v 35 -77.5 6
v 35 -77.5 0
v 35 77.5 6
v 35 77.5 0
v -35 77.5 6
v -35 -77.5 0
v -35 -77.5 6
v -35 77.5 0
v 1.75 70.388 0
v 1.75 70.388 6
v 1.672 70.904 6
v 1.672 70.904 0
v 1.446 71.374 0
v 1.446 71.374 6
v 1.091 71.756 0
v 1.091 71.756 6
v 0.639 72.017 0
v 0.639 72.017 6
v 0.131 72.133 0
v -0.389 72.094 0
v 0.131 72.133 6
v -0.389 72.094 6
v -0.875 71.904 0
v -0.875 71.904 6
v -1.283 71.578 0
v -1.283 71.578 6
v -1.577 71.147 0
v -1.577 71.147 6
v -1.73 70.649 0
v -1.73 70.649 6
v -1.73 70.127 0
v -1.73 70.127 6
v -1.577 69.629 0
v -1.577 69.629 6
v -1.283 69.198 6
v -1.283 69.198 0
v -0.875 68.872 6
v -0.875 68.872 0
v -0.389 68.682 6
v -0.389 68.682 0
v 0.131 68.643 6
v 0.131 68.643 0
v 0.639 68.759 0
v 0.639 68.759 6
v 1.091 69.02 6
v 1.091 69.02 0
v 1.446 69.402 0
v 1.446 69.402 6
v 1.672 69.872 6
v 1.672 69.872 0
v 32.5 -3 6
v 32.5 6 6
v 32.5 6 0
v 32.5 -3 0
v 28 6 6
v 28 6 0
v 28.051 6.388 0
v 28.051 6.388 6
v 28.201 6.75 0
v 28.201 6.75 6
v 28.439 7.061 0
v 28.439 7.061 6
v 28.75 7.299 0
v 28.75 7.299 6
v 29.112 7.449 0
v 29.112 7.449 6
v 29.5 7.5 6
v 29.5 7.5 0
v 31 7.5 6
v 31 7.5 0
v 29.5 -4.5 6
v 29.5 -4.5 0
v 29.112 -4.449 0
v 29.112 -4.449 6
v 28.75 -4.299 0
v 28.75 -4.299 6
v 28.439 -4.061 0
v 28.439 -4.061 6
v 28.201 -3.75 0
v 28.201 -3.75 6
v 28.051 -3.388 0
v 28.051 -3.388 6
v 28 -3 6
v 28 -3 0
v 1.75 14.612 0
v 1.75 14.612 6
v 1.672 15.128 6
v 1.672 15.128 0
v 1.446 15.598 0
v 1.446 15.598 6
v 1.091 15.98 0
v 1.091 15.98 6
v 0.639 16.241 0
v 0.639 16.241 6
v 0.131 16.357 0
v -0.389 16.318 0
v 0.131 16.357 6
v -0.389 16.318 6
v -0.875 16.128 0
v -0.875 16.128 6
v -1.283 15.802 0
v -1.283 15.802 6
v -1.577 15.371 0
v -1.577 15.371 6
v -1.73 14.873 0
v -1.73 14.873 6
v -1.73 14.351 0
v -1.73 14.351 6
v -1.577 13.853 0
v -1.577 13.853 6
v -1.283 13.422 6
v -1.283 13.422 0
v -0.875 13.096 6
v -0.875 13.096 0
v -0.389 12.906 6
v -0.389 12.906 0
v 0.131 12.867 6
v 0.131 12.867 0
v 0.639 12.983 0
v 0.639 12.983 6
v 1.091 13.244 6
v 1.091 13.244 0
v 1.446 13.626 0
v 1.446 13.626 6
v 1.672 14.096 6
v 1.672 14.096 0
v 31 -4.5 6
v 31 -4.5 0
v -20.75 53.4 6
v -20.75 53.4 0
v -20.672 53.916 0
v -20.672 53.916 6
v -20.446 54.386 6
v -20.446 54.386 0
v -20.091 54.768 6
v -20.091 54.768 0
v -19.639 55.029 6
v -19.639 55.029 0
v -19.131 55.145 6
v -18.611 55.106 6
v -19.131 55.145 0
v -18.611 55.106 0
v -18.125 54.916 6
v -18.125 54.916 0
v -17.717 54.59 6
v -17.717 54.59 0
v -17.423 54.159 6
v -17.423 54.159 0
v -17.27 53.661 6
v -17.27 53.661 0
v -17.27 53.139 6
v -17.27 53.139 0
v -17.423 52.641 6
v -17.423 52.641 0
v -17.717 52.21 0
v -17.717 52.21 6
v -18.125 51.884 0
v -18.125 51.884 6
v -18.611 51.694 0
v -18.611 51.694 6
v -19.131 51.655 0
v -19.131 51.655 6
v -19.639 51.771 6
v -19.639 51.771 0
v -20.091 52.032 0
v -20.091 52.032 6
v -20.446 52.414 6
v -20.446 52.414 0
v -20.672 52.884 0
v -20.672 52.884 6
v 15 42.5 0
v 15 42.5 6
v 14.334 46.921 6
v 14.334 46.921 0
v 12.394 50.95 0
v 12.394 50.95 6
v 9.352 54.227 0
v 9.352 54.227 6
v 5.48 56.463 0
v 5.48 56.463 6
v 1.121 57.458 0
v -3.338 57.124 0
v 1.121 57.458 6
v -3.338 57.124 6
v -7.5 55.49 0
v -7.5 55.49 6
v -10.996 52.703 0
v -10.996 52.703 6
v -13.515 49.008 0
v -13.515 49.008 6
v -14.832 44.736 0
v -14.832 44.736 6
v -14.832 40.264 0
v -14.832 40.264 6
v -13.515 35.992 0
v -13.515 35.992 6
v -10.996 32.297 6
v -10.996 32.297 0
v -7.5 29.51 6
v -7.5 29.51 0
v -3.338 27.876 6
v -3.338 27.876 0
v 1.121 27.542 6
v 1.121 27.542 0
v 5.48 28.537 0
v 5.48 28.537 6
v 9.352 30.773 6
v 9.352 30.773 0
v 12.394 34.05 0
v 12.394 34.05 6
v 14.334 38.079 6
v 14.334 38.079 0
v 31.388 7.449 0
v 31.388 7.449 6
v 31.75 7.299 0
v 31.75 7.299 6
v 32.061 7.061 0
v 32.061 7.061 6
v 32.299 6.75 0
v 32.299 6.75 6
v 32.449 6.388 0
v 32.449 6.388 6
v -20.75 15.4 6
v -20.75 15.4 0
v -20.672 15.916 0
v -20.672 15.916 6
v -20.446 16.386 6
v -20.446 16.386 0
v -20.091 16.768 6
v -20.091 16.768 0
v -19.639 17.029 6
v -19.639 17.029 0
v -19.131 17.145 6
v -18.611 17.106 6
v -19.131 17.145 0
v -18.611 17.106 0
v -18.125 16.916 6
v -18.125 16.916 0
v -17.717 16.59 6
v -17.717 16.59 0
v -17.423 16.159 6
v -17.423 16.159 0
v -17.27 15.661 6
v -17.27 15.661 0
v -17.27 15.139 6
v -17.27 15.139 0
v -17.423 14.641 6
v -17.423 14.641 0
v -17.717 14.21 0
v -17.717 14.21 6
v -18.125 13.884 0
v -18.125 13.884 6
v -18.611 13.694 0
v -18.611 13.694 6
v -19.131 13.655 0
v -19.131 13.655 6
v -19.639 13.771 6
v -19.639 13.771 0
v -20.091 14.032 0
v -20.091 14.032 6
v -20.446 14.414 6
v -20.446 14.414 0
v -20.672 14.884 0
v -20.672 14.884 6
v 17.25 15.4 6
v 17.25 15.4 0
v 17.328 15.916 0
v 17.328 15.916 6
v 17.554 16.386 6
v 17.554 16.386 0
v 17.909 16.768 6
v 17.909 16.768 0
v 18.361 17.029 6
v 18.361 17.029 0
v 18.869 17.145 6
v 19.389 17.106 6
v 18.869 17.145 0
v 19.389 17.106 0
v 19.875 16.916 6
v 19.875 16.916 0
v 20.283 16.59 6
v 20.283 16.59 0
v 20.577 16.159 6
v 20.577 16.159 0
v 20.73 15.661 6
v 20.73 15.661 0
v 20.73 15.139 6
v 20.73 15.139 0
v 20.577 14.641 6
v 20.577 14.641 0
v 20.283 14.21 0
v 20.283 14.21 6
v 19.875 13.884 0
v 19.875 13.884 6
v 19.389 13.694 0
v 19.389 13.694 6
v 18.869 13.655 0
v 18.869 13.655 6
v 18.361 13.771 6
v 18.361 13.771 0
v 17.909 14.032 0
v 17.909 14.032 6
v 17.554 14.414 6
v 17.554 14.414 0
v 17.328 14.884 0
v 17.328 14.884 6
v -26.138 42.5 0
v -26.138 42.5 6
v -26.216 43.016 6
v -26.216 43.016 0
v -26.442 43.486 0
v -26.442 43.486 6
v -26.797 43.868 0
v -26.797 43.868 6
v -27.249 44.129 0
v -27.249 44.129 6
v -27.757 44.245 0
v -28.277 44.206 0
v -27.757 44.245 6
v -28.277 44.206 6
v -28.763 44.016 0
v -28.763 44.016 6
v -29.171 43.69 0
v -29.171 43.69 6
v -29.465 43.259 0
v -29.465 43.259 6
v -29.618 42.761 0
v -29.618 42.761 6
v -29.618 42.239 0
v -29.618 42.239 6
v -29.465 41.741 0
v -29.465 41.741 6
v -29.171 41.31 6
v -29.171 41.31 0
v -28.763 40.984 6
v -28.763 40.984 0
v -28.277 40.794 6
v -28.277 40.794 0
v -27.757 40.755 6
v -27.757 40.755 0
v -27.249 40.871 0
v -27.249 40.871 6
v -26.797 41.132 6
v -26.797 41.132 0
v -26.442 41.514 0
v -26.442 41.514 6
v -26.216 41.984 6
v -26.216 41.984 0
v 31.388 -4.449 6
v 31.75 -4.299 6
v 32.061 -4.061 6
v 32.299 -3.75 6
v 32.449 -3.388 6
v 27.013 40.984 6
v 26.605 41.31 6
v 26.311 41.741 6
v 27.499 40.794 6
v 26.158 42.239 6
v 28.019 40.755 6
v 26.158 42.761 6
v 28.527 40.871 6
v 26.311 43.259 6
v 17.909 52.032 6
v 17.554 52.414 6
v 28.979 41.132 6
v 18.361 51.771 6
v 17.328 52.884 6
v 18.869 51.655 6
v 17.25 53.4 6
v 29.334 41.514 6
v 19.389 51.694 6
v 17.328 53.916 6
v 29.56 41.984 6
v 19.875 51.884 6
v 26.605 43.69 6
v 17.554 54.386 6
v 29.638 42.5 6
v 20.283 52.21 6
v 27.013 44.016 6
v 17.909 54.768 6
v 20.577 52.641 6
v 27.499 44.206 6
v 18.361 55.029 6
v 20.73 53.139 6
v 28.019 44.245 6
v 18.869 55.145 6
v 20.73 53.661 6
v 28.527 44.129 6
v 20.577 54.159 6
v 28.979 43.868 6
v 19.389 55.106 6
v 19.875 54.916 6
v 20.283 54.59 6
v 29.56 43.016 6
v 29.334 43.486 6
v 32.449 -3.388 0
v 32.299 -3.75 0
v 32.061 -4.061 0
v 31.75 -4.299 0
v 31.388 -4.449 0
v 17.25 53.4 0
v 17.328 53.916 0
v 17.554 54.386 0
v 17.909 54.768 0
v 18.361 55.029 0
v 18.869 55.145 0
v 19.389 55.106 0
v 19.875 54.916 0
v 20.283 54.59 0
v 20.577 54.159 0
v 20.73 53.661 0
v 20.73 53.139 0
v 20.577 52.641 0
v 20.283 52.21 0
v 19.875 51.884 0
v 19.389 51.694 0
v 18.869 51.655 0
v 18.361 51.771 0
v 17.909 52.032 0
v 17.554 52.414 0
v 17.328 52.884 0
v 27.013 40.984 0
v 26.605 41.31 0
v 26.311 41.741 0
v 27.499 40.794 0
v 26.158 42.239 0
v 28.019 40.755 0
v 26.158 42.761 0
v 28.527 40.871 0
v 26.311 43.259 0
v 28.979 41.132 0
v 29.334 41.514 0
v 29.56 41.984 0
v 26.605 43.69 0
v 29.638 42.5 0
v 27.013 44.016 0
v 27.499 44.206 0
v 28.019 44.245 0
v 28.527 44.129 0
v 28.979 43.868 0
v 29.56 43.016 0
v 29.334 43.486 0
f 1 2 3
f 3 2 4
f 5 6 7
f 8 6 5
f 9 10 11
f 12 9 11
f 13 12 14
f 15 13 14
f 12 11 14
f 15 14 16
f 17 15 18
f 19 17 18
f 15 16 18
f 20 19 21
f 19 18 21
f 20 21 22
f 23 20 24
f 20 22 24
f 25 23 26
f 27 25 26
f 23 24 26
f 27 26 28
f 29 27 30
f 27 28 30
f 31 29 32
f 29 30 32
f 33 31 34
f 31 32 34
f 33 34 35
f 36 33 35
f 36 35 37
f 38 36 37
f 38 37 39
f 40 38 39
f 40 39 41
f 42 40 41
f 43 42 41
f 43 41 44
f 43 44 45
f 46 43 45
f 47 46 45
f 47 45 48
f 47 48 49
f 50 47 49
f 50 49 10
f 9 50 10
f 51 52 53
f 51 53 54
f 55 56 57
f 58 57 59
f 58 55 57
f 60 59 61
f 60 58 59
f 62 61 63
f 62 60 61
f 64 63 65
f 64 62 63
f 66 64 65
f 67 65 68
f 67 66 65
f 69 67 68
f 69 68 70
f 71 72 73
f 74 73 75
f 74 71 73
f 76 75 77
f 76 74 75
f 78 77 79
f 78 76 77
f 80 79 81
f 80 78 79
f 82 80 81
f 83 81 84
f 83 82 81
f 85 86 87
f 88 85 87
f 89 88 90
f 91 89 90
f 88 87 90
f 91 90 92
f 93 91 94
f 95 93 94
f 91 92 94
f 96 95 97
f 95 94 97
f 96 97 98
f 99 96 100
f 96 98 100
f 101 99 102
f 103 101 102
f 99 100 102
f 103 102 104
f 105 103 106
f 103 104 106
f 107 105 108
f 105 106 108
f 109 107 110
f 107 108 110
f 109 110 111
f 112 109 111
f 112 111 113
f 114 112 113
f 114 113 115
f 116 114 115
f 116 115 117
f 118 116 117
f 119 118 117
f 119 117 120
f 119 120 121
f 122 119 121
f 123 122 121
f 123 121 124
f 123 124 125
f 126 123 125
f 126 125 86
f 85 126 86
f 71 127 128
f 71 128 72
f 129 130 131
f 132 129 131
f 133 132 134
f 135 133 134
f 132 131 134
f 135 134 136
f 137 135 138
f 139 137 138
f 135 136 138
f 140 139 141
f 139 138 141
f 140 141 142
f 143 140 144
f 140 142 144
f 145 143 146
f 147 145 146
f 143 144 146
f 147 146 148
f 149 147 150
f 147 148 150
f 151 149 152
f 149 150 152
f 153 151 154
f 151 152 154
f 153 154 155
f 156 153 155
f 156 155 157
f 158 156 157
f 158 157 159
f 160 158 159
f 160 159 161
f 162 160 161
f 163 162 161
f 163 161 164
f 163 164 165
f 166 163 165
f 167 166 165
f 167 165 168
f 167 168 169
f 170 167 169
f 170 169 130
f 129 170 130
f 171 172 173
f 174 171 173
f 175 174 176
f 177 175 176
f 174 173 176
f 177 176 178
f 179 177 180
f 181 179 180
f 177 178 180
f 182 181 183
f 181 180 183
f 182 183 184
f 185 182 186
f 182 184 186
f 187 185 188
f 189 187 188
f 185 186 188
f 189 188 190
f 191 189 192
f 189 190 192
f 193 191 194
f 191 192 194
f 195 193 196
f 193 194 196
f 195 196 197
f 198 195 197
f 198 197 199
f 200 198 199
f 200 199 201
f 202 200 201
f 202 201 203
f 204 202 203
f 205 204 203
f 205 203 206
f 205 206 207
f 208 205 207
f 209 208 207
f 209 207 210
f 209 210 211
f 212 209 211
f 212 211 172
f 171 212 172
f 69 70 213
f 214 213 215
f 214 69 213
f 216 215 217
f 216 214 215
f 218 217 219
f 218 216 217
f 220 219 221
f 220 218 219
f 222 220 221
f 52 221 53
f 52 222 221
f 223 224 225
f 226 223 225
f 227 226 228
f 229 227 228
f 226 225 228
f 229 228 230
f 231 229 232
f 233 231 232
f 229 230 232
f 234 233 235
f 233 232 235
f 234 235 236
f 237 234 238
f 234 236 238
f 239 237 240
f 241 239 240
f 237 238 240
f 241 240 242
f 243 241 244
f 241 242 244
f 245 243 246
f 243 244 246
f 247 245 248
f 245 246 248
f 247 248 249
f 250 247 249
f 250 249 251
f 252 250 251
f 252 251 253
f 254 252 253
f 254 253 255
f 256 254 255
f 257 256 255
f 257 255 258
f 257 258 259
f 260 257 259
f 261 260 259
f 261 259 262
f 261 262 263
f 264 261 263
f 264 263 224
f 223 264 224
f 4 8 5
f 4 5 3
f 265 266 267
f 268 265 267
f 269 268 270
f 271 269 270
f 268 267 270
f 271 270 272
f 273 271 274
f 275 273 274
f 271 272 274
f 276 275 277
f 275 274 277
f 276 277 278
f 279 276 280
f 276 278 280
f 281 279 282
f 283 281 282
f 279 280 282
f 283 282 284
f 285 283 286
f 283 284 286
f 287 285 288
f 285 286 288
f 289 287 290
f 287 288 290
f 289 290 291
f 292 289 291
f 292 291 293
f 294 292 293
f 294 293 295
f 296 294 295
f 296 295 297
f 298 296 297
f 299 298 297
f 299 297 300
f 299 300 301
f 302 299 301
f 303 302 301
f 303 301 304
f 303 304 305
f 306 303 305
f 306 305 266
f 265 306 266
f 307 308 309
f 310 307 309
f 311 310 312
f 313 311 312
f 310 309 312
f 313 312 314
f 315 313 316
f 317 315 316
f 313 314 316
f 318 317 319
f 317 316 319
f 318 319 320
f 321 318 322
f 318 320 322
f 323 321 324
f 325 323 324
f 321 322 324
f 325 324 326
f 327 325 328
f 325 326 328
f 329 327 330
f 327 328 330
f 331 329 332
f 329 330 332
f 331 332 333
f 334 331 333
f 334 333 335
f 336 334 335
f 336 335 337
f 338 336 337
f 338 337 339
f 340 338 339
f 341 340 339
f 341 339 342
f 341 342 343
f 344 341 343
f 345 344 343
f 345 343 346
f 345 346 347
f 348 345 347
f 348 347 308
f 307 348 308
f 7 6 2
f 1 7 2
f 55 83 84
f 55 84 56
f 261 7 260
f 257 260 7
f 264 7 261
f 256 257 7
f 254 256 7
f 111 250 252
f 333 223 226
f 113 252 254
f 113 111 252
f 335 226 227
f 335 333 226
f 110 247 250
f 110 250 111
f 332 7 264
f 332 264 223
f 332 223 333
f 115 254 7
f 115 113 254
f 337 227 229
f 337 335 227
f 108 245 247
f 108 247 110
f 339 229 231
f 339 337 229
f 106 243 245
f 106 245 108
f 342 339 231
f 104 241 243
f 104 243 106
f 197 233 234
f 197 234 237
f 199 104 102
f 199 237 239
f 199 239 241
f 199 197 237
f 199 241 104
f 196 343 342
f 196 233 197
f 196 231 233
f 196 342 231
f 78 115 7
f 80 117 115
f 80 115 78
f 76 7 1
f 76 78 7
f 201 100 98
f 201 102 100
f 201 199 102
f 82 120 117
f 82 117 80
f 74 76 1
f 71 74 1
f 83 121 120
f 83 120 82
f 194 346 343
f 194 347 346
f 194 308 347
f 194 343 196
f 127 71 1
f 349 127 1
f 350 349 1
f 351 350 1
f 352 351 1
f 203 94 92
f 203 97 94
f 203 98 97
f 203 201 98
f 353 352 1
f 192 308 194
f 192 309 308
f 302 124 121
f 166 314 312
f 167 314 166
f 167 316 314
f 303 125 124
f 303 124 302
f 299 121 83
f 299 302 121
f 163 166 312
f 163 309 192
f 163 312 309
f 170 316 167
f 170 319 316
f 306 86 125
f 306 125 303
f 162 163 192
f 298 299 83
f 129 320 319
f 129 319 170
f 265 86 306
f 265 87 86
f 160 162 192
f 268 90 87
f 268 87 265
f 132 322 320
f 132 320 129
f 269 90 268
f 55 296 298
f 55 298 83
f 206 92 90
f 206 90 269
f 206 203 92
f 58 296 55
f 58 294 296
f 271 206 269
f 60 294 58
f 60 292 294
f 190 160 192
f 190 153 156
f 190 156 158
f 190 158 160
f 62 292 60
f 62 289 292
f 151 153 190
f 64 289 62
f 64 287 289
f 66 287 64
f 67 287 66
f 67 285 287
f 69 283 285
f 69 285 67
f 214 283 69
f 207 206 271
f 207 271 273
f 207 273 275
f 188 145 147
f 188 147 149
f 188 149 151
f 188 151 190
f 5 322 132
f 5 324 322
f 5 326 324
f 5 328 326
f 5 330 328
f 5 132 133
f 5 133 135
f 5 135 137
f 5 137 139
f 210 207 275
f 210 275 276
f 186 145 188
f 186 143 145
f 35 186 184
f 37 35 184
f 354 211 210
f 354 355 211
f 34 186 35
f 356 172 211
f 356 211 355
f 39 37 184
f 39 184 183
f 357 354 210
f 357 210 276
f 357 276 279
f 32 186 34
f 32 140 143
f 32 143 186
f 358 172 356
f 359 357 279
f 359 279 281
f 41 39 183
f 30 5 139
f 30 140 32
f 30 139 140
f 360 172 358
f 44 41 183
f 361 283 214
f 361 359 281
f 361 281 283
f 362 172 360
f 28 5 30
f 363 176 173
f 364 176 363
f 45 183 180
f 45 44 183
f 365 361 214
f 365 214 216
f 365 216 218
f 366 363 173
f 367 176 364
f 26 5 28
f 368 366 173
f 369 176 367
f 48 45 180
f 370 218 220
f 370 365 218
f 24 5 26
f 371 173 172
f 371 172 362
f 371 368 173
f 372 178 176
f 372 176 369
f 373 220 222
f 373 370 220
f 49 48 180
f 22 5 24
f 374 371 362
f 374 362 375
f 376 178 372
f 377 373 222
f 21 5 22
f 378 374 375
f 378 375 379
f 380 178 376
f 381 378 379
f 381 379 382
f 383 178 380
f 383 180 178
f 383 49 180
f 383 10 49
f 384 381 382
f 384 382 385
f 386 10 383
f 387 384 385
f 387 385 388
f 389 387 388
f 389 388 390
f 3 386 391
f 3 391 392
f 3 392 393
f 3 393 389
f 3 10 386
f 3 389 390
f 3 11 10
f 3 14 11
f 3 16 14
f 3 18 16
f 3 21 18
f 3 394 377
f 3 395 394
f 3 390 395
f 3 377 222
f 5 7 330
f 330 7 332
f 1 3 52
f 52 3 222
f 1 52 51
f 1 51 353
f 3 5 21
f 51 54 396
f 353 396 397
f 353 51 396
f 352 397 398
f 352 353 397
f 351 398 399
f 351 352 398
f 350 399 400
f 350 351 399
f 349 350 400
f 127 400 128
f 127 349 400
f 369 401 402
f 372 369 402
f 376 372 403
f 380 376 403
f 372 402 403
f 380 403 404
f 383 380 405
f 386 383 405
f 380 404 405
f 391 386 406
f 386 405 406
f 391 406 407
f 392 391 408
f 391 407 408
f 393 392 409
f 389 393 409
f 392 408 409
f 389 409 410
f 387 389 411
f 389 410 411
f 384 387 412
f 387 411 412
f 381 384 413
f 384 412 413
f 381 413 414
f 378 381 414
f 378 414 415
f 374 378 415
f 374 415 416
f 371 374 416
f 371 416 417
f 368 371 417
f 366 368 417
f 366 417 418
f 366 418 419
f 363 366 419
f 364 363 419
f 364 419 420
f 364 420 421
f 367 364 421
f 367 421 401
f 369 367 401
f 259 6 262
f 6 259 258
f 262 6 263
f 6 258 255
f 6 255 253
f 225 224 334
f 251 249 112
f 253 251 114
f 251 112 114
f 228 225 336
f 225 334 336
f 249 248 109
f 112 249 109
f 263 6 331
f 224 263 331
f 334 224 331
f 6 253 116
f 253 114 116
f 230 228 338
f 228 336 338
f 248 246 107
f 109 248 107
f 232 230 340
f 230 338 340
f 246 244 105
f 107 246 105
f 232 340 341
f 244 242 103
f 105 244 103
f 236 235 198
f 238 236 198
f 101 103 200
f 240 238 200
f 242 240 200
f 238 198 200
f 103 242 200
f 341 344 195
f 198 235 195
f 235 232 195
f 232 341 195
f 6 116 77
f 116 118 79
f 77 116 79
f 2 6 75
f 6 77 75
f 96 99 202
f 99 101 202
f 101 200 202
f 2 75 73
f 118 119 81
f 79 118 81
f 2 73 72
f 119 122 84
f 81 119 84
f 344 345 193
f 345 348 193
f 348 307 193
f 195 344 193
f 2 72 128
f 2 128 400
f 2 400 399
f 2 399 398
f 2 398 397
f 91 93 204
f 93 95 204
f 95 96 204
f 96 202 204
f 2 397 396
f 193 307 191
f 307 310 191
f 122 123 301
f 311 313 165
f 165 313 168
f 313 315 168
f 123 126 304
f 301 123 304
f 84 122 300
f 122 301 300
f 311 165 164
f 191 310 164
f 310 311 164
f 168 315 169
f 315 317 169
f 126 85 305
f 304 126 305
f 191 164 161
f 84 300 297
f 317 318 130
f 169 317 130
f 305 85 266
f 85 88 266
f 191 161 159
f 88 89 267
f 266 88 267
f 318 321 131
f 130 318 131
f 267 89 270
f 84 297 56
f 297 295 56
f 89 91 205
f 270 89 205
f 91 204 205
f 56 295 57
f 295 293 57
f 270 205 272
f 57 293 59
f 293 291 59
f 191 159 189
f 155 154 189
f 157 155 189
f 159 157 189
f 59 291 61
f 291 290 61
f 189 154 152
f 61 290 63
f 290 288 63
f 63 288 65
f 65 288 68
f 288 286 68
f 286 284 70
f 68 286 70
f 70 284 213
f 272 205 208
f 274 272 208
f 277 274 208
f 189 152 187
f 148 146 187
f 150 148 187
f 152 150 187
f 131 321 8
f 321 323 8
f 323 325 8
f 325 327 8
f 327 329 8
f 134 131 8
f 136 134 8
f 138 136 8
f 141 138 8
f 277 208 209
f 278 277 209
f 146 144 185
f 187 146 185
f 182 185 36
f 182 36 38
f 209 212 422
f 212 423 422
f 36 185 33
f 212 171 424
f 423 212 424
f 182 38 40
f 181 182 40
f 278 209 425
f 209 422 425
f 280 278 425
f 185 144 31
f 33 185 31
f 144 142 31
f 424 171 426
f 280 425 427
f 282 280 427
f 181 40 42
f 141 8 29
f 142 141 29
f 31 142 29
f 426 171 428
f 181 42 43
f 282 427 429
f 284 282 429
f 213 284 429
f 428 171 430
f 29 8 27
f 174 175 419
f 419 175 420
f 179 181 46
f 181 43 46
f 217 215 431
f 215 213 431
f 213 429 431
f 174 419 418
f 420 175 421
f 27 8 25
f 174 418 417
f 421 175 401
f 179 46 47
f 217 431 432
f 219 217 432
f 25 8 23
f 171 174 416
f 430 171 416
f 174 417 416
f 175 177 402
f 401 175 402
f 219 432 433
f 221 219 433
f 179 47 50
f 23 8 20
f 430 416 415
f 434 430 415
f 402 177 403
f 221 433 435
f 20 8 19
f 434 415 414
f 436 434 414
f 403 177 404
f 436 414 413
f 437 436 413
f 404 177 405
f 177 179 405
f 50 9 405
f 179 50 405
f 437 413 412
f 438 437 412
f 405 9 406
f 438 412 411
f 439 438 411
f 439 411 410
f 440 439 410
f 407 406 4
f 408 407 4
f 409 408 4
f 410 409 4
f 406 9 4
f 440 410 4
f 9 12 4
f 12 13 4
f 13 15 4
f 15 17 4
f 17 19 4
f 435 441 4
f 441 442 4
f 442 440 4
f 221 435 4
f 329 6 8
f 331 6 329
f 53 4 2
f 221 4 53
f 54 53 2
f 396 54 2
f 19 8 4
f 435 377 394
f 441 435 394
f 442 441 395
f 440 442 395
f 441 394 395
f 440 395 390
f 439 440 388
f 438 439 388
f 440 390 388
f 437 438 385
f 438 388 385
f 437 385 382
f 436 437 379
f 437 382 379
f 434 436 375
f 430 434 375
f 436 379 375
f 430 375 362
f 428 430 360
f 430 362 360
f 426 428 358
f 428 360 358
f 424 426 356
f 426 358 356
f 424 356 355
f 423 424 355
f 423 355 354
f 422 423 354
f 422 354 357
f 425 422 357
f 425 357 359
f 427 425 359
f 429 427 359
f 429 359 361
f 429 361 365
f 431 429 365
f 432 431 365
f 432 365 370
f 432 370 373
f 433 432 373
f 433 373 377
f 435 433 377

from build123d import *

# Parameters (mm, degrees)
SKETCH1_W           = 70
SKETCH1_H           = 155
BOSS_EXTRUDE1_DEPTH = 6
SKETCH3_R           = 15
CUT_EXTRUDE1_DEPTH  = 86.248167136
SKETCH4_R           = 1.75
CUT_EXTRUDE2_DEPTH  = 86.248167136
CUT_EXTRUDE3_DEPTH  = 86.248167136
SKETCH8_R           = 1.75
CUT_EXTRUDE6_DEPTH  = 86.248167136


with BuildPart() as part:
    # Sketch1 → Boss-Extrude1 (new body)
    with BuildSketch(Plane.XY):
        Rectangle(SKETCH1_W, SKETCH1_H)
    extrude(amount=BOSS_EXTRUDE1_DEPTH)

    # Sketch3 → Cut-Extrude1 (cut, through all)
    with BuildSketch(Plane.XY.offset(6)):
        with Locations((0, 42.5)):
            Circle(SKETCH3_R)
    extrude(amount=-CUT_EXTRUDE1_DEPTH, mode=Mode.SUBTRACT)

    # Sketch4 → Cut-Extrude2 (cut, through all)
    with BuildSketch(Plane(origin=(0, 0, 0), x_dir=(-1, 0, 0), z_dir=(0, 0, -1))):
        with Locations((-19, 53.4)):
            Circle(SKETCH4_R)
        with Locations((19, 53.4)):
            Circle(SKETCH4_R)
        with Locations((-19, 15.4)):
            Circle(SKETCH4_R)
        with Locations((19, 15.4)):
            Circle(SKETCH4_R)
    extrude(amount=-CUT_EXTRUDE2_DEPTH, mode=Mode.SUBTRACT)

    # Sketch5 → Cut-Extrude3 (cut, through all)
    with BuildSketch(Plane.XY.offset(6)):
        with BuildLine():
            Line((29.5, 7.5), (31, 7.5))
            ThreePointArc((31, 7.5), (32.060660172, 7.060660172), (32.5, 6))
            Line((32.5, 6), (32.5, -3))
            ThreePointArc((32.5, -3), (32.060660172, -4.060660172), (31, -4.5))
            Line((31, -4.5), (29.5, -4.5))
            ThreePointArc((29.5, -4.5), (28.439339828, -4.060660172), (28, -3))
            Line((28, -3), (28, 6))
            ThreePointArc((28, 6), (28.439339828, 7.060660172), (29.5, 7.5))
        make_face()
    extrude(amount=-CUT_EXTRUDE3_DEPTH, mode=Mode.SUBTRACT)

    # Sketch8 → Cut-Extrude6 (cut, through all)
    with BuildSketch(Plane.XY.offset(6)):
        with Locations((-27.888022688, 42.5)):
            Circle(SKETCH8_R)
        with Locations((0, 14.611977312)):
            Circle(SKETCH8_R)
        with Locations((27.888022688, 42.5)):
            Circle(SKETCH8_R)
        with Locations((0, 70.388022688)):
            Circle(SKETCH8_R)
    extrude(amount=-CUT_EXTRUDE6_DEPTH, mode=Mode.SUBTRACT)


solid = part.part
